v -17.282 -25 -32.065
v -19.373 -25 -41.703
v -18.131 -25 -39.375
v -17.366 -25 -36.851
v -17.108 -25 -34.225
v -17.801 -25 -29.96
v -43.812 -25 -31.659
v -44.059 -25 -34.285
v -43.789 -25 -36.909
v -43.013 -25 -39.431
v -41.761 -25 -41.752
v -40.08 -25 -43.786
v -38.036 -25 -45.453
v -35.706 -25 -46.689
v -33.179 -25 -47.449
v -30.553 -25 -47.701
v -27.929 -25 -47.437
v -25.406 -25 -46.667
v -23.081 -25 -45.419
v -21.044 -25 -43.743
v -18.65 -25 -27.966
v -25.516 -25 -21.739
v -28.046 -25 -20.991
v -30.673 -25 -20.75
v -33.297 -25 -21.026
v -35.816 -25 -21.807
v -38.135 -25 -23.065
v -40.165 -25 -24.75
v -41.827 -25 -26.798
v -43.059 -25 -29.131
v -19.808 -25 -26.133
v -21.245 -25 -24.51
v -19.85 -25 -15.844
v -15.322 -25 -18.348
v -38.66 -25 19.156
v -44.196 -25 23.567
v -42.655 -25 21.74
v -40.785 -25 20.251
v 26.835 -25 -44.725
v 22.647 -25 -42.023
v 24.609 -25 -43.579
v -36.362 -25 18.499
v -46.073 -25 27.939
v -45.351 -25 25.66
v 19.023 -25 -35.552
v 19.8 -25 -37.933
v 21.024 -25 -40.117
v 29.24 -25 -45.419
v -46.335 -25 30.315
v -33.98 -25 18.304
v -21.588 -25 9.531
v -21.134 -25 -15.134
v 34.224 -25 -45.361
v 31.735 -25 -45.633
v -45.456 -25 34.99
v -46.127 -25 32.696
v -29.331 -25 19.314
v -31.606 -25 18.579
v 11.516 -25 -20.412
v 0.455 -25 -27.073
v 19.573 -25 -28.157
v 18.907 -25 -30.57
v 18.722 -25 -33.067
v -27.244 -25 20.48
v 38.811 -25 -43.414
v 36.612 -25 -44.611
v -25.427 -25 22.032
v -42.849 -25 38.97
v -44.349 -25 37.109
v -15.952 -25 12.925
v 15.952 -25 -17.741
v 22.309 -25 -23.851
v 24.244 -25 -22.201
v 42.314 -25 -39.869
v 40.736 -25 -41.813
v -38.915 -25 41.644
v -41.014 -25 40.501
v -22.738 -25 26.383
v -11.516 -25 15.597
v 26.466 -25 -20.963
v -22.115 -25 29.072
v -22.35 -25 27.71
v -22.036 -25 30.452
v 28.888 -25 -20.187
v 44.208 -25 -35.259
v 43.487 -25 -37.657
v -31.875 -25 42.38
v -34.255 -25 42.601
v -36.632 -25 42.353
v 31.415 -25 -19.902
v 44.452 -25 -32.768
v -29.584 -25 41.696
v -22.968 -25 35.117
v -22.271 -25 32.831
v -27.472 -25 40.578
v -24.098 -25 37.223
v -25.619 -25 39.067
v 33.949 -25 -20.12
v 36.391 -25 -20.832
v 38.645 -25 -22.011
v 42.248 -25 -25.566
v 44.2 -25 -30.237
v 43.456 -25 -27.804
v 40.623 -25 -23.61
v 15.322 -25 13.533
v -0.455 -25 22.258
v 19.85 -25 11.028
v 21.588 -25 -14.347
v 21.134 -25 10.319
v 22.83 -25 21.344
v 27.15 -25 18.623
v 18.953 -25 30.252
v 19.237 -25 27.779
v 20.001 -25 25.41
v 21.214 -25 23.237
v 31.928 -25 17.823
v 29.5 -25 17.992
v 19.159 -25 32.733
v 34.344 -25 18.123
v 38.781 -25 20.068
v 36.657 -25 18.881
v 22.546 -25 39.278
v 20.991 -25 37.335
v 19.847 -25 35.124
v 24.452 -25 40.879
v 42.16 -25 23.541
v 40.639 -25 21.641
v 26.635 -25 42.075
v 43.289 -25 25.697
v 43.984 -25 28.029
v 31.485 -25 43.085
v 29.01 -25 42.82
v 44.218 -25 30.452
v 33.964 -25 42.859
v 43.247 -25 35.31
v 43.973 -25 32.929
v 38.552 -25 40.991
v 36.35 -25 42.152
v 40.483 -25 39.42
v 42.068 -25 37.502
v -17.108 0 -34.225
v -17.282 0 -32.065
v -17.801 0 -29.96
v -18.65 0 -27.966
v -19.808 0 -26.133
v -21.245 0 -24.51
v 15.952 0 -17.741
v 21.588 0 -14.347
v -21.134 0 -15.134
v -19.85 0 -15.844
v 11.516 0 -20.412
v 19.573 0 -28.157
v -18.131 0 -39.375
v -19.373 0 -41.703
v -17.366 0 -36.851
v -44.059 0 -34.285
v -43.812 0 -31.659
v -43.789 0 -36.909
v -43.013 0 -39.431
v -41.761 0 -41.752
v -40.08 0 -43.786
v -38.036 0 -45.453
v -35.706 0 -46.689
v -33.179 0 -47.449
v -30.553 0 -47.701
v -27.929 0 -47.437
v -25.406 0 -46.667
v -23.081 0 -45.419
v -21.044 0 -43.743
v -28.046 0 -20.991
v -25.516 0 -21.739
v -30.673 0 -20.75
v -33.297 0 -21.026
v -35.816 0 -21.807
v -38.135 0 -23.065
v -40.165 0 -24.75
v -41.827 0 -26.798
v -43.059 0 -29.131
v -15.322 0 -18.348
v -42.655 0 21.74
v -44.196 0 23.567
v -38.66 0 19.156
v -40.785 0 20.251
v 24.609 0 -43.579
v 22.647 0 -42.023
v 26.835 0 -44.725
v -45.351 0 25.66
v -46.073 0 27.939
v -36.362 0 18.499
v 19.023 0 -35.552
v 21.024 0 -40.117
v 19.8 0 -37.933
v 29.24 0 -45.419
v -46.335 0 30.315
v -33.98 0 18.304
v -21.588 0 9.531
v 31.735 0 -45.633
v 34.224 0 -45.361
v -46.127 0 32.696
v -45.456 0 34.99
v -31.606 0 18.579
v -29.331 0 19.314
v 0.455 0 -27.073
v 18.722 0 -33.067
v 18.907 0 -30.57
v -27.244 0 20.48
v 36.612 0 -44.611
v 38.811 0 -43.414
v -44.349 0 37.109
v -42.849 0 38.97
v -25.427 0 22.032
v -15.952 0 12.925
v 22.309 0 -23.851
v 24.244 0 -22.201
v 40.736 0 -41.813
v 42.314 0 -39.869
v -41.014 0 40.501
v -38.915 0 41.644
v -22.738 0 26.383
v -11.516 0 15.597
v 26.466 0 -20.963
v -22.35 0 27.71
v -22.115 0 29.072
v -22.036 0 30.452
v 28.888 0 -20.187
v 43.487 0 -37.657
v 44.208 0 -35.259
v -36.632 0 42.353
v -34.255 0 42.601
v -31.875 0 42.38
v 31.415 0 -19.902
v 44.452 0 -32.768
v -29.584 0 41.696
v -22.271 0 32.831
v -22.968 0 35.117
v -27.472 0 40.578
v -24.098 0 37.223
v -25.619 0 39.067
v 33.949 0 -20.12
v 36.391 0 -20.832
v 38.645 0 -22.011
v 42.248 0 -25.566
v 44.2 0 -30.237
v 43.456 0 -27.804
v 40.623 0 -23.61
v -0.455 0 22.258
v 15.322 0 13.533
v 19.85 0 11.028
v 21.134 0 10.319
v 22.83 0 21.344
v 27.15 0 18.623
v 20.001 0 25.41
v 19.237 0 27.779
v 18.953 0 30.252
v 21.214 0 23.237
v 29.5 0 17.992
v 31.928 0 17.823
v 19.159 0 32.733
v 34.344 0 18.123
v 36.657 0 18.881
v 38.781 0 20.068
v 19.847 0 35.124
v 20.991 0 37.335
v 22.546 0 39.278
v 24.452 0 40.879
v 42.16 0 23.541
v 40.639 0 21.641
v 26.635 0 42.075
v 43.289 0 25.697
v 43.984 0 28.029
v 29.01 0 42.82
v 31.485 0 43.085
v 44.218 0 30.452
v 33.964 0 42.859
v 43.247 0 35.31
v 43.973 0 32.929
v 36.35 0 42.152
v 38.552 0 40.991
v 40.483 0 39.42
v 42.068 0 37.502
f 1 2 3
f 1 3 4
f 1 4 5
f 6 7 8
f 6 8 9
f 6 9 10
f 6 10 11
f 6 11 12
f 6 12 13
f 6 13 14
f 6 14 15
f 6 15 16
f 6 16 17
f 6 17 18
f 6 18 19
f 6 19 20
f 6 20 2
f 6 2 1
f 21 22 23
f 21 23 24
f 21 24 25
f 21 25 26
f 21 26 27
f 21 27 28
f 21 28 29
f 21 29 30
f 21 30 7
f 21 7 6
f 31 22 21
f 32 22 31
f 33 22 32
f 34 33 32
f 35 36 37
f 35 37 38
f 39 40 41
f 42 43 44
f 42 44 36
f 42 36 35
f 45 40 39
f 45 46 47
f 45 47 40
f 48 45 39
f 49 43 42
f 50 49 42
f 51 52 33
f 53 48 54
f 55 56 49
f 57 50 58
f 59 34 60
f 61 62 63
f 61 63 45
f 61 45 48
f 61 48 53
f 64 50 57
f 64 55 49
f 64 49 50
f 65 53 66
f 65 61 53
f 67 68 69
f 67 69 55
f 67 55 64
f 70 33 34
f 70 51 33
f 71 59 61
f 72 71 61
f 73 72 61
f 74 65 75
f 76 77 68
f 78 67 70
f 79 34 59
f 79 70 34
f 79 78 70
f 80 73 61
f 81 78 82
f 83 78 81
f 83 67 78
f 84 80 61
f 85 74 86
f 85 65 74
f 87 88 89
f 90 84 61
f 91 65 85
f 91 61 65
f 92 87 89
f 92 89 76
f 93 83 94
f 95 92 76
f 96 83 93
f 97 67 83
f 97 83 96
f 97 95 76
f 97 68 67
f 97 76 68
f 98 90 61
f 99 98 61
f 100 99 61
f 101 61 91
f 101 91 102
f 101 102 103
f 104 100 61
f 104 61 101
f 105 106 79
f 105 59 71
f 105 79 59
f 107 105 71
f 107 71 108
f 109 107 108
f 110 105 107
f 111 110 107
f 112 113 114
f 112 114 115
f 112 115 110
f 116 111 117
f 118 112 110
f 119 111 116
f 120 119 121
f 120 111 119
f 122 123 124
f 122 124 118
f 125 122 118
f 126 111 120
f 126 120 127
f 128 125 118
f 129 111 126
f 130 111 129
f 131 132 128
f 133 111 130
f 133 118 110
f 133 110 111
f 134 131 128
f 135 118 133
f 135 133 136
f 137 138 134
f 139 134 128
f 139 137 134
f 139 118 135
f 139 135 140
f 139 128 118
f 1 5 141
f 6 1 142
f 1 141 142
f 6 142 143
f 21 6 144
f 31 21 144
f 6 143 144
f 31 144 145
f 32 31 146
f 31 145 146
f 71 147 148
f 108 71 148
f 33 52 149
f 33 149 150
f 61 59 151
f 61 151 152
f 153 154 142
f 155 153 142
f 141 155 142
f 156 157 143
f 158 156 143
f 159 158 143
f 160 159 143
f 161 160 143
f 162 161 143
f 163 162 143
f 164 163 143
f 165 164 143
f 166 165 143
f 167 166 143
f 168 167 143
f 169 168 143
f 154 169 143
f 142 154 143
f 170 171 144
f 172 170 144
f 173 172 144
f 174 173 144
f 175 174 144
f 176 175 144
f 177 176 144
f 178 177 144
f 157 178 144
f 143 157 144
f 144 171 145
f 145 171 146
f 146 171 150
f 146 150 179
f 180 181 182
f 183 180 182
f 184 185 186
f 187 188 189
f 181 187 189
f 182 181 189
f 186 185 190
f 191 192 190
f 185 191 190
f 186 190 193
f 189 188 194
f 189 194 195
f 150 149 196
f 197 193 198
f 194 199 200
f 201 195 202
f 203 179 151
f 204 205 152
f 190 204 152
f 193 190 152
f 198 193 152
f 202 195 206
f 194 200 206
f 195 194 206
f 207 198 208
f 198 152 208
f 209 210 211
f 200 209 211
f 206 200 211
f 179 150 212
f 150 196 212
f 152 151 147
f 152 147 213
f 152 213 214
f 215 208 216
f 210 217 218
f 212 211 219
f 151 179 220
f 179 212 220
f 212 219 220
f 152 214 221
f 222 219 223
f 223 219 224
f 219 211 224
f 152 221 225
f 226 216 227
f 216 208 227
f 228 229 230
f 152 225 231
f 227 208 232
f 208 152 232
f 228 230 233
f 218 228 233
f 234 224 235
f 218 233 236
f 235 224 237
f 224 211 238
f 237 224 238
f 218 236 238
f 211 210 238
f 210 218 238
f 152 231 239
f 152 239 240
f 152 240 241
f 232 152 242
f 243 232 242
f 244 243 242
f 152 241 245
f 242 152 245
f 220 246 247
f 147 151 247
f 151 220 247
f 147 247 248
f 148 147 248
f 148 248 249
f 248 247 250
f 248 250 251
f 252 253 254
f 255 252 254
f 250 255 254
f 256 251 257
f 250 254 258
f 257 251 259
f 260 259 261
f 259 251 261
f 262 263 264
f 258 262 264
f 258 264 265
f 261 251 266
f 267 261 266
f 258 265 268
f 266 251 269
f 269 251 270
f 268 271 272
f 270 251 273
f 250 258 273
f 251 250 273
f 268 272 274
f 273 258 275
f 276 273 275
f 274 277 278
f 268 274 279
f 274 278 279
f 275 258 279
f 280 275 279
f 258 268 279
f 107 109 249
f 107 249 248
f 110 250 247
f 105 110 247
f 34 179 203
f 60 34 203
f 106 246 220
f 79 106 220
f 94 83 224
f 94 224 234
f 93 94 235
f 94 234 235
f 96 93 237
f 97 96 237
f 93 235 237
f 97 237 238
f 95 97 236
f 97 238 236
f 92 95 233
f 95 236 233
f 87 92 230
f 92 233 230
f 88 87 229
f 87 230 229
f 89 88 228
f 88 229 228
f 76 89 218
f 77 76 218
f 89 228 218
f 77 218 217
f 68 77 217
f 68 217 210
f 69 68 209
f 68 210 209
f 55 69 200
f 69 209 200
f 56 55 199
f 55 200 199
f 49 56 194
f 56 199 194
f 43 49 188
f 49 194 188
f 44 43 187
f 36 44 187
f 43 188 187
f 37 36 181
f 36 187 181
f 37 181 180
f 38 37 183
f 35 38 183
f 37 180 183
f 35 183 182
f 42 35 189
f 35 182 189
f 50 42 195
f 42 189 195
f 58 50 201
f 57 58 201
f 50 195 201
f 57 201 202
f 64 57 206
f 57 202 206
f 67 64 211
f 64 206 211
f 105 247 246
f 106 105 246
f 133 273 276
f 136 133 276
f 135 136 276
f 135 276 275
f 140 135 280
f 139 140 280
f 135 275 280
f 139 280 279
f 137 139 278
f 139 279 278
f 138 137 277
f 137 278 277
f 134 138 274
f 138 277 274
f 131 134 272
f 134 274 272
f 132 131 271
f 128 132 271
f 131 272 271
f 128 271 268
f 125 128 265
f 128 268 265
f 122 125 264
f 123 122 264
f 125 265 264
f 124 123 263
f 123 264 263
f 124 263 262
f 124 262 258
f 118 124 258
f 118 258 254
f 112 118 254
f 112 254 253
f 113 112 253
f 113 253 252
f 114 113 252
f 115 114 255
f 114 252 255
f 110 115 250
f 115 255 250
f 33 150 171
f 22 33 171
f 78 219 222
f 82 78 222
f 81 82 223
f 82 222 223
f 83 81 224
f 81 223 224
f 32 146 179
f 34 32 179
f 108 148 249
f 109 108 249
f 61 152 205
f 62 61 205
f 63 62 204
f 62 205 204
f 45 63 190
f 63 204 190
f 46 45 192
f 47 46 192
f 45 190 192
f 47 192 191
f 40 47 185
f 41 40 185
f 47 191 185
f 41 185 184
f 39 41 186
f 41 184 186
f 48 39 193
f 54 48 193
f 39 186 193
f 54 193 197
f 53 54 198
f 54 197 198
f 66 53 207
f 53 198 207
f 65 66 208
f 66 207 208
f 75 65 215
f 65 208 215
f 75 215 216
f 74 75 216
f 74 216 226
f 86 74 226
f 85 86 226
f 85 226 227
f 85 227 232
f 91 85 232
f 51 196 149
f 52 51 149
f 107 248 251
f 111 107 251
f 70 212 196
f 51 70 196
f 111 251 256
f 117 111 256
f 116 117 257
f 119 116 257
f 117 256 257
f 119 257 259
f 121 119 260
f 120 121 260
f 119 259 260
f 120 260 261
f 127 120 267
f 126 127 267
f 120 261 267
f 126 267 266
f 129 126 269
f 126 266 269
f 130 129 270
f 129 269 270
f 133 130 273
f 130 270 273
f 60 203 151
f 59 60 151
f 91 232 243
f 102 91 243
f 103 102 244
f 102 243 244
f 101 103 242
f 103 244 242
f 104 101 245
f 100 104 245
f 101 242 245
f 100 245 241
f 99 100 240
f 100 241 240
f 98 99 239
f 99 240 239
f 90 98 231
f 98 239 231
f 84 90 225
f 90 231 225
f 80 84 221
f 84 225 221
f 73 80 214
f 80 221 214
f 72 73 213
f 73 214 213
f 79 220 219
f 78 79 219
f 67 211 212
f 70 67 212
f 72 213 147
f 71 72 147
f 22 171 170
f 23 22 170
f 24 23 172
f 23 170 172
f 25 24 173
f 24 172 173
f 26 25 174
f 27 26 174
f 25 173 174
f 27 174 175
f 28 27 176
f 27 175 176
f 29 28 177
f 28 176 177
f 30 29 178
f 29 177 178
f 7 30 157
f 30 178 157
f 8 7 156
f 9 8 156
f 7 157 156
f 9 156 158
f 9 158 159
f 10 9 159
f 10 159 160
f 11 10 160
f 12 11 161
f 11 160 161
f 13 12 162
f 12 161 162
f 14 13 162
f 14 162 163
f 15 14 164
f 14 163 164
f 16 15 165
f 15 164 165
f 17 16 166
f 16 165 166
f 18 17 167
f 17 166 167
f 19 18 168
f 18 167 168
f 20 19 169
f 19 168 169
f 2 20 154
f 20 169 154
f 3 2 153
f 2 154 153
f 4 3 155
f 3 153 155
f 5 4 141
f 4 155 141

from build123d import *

# Parameters (mm, degrees)
F1_DEPTH = 25


with BuildPart() as f1:
    # F0 (on Front) → F1 (new body)
    with BuildSketch(Plane.XZ):
        Polygon((-3.6047625217, 1.0570984669), (0, -2.4078239221), (3.464922389, 1.1969385996), (-11.515979737, 15.5966841781), (-15.9519963441, 12.9253440602), align=None)
        Polygon((-3.464922389, -6.0125864438), (0, -2.4078239221), (-3.6047625217, 1.0570984669), (-19.8503045149, -15.8440942143), (-15.3221144811, -18.3483206589), align=None)
        Polygon((3.464922389, 1.1969385996), (0, -2.4078239221), (3.6047625217, -5.8727463111), (19.8503045149, 11.0284463701), (15.3221144811, 13.5326728147), align=None)
        Polygon((3.6047625217, -5.8727463111), (0, -2.4078239221), (-3.464922389, -6.0125864438), (11.515979737, -20.4123320224), (15.9519963441, -17.7409919044), align=None)
        Polygon((-11.515979737, 15.5966841781), (3.464922389, 1.1969385996), (15.3221144811, 13.5326728147), (-0.4546866072, 22.2577223822), align=None)
        Polygon((-19.8503045149, -15.8440942143), (-3.6047625217, 1.0570984669), (-15.9519963441, 12.9253440602), (-21.5883330014, 9.5311790774), (-21.1336463941, -15.1343672269), align=None)
        Polygon((19.8503045149, 11.0284463701), (3.6047625217, -5.8727463111), (15.9519963441, -17.7409919044), (21.5883330014, -14.3468269216), (21.1336463941, 10.3187193827), align=None)
        Polygon((11.515979737, -20.4123320224), (-3.464922389, -6.0125864438), (-15.3221144811, -18.3483206589), (0.4546866072, -27.0733702264), align=None)
        with BuildLine():
            Line((22.8301708876, 21.3437454179), (15.3221144811, 13.5326728147))
            Line((15.3221144811, 13.5326728147), (19.8503045149, 11.0284463701))
            Line((19.8503045149, 11.0284463701), (27.1497799567, 18.6225199298))
            ThreePointArc((27.1497799567, 18.6225199298), (24.8510842543, 19.7626601145), (22.8301708876, 21.3437454179))
        make_face()
        with BuildLine():
            Line((-15.9519963441, 12.9253440602), (-11.515979737, 15.5966841781))
            Line((-11.515979737, 15.5966841781), (-22.7377914526, 26.3831663457))
            ThreePointArc((-22.7377914526, 26.3831663457), (-23.8506538485, 24.0646862159), (-25.4265858042, 22.0323842464))
            Line((-25.4265858042, 22.0323842464), (-15.9519963441, 12.9253440602))
        make_face()
        with BuildLine():
            Line((-15.3221144811, -18.3483206589), (-19.8503045149, -15.8440942143))
            Line((-19.8503045149, -15.8440942143), (-25.5164120913, -21.7388791308))
            ThreePointArc((-25.5164120913, -21.7388791308), (-23.2486379111, -22.9210064368), (-21.2450357109, -24.5102839214))
            Line((-21.2450357109, -24.5102839214), (-15.3221144811, -18.3483206589))
        make_face()
        with BuildLine():
            Line((22.3086725412, -23.8510725387), (15.9519963441, -17.7409919044))
            Line((15.9519963441, -17.7409919044), (11.515979737, -20.4123320224))
            Line((11.515979737, -20.4123320224), (19.572802502, -28.156605165))
            ThreePointArc((19.572802502, -28.156605165), (20.7252240198, -25.866894835), (22.3086725412, -23.8510725387))
        make_face()
        with BuildLine():
            ThreePointArc((44.2184696223, 30.4518900812), (26.6351729101, 42.0753321486), (22.8301708876, 21.3437454179))
            ThreePointArc((22.8301708876, 21.3437454179), (24.8510842543, 19.7626601145), (27.1497799567, 18.6225199298))
            ThreePointArc((27.1497799567, 18.6225199298), (38.7812636853, 20.0683193432), (44.2184696223, 30.4518900812))
        make_face()
        with BuildLine():
            Line((-29.2176456857, 32.6116465505), (-22.7377914526, 26.3831663457))
            ThreePointArc((-22.7377914526, 26.3831663457), (-22.2129285463, 28.3875102161), (-22.0362616439, 30.4518900812))
            ThreePointArc((-22.0362616439, 30.4518900812), (-45.4561166366, 34.9901269749), (-25.4265858042, 22.0323842464))
            Line((-25.4265858042, 22.0323842464), (-34.185892847, 30.4518900812))
            Line((-34.185892847, 30.4518900812), (-29.2176456857, 32.6116465505))
        make_face()
        with BuildLine():
            ThreePointArc((-25.4265858042, 22.0323842464), (-23.8506538485, 24.0646862159), (-22.7377914526, 26.3831663457))
            Line((-22.7377914526, 26.3831663457), (-29.2176456857, 32.6116465505))
            Line((-29.2176456857, 32.6116465505), (-34.185892847, 30.4518900812))
            Line((-34.185892847, 30.4518900812), (-25.4265858042, 22.0323842464))
        make_face()
        with BuildLine():
            Line((-34.1880838364, -30.7605291991), (-25.5164120913, -21.7388791308))
            ThreePointArc((-25.5164120913, -21.7388791308), (-41.7606868501, -41.7523739668), (-17.1078598825, -34.2254515881))
            ThreePointArc((-17.1078598825, -34.2254515881), (-18.1852212928, -28.9457568377), (-21.2450357109, -24.5102839214))
            Line((-21.2450357109, -24.5102839214), (-30.5833213146, -34.2254515881))
            Line((-30.5833213146, -34.2254515881), (-34.1880838364, -30.7605291991))
        make_face()
        with BuildLine():
            ThreePointArc((-21.2450357109, -24.5102839214), (-23.2486379111, -22.9210064368), (-25.5164120913, -21.7388791308))
            Line((-25.5164120913, -21.7388791308), (-34.1880838364, -30.7605291991))
            Line((-34.1880838364, -30.7605291991), (-30.5833213146, -34.2254515881))
            Line((-30.5833213146, -34.2254515881), (-21.2450357109, -24.5102839214))
        make_face()
        with BuildLine():
            ThreePointArc((44.4517230245, -32.7675244671), (36.3910799417, -20.832096116), (22.3086725412, -23.8510725387))
            Line((22.3086725412, -23.8510725387), (31.5849818289, -32.7675244671))
            Line((31.5849818289, -32.7675244671), (28.1200594399, -36.3722869888))
            Line((28.1200594399, -36.3722869888), (19.572802502, -28.156605165))
            ThreePointArc((19.572802502, -28.156605165), (29.2402615472, -45.4188214676), (44.4517230245, -32.7675244671))
        make_face()
        with BuildLine():
            Line((31.5849818289, -32.7675244671), (22.3086725412, -23.8510725387))
            ThreePointArc((22.3086725412, -23.8510725387), (20.7252240198, -25.866894835), (19.572802502, -28.156605165))
            Line((19.572802502, -28.156605165), (28.1200594399, -36.3722869888))
            Line((28.1200594399, -36.3722869888), (31.5849818289, -32.7675244671))
        make_face()
    extrude(amount=F1_DEPTH)


solid = f1.part
